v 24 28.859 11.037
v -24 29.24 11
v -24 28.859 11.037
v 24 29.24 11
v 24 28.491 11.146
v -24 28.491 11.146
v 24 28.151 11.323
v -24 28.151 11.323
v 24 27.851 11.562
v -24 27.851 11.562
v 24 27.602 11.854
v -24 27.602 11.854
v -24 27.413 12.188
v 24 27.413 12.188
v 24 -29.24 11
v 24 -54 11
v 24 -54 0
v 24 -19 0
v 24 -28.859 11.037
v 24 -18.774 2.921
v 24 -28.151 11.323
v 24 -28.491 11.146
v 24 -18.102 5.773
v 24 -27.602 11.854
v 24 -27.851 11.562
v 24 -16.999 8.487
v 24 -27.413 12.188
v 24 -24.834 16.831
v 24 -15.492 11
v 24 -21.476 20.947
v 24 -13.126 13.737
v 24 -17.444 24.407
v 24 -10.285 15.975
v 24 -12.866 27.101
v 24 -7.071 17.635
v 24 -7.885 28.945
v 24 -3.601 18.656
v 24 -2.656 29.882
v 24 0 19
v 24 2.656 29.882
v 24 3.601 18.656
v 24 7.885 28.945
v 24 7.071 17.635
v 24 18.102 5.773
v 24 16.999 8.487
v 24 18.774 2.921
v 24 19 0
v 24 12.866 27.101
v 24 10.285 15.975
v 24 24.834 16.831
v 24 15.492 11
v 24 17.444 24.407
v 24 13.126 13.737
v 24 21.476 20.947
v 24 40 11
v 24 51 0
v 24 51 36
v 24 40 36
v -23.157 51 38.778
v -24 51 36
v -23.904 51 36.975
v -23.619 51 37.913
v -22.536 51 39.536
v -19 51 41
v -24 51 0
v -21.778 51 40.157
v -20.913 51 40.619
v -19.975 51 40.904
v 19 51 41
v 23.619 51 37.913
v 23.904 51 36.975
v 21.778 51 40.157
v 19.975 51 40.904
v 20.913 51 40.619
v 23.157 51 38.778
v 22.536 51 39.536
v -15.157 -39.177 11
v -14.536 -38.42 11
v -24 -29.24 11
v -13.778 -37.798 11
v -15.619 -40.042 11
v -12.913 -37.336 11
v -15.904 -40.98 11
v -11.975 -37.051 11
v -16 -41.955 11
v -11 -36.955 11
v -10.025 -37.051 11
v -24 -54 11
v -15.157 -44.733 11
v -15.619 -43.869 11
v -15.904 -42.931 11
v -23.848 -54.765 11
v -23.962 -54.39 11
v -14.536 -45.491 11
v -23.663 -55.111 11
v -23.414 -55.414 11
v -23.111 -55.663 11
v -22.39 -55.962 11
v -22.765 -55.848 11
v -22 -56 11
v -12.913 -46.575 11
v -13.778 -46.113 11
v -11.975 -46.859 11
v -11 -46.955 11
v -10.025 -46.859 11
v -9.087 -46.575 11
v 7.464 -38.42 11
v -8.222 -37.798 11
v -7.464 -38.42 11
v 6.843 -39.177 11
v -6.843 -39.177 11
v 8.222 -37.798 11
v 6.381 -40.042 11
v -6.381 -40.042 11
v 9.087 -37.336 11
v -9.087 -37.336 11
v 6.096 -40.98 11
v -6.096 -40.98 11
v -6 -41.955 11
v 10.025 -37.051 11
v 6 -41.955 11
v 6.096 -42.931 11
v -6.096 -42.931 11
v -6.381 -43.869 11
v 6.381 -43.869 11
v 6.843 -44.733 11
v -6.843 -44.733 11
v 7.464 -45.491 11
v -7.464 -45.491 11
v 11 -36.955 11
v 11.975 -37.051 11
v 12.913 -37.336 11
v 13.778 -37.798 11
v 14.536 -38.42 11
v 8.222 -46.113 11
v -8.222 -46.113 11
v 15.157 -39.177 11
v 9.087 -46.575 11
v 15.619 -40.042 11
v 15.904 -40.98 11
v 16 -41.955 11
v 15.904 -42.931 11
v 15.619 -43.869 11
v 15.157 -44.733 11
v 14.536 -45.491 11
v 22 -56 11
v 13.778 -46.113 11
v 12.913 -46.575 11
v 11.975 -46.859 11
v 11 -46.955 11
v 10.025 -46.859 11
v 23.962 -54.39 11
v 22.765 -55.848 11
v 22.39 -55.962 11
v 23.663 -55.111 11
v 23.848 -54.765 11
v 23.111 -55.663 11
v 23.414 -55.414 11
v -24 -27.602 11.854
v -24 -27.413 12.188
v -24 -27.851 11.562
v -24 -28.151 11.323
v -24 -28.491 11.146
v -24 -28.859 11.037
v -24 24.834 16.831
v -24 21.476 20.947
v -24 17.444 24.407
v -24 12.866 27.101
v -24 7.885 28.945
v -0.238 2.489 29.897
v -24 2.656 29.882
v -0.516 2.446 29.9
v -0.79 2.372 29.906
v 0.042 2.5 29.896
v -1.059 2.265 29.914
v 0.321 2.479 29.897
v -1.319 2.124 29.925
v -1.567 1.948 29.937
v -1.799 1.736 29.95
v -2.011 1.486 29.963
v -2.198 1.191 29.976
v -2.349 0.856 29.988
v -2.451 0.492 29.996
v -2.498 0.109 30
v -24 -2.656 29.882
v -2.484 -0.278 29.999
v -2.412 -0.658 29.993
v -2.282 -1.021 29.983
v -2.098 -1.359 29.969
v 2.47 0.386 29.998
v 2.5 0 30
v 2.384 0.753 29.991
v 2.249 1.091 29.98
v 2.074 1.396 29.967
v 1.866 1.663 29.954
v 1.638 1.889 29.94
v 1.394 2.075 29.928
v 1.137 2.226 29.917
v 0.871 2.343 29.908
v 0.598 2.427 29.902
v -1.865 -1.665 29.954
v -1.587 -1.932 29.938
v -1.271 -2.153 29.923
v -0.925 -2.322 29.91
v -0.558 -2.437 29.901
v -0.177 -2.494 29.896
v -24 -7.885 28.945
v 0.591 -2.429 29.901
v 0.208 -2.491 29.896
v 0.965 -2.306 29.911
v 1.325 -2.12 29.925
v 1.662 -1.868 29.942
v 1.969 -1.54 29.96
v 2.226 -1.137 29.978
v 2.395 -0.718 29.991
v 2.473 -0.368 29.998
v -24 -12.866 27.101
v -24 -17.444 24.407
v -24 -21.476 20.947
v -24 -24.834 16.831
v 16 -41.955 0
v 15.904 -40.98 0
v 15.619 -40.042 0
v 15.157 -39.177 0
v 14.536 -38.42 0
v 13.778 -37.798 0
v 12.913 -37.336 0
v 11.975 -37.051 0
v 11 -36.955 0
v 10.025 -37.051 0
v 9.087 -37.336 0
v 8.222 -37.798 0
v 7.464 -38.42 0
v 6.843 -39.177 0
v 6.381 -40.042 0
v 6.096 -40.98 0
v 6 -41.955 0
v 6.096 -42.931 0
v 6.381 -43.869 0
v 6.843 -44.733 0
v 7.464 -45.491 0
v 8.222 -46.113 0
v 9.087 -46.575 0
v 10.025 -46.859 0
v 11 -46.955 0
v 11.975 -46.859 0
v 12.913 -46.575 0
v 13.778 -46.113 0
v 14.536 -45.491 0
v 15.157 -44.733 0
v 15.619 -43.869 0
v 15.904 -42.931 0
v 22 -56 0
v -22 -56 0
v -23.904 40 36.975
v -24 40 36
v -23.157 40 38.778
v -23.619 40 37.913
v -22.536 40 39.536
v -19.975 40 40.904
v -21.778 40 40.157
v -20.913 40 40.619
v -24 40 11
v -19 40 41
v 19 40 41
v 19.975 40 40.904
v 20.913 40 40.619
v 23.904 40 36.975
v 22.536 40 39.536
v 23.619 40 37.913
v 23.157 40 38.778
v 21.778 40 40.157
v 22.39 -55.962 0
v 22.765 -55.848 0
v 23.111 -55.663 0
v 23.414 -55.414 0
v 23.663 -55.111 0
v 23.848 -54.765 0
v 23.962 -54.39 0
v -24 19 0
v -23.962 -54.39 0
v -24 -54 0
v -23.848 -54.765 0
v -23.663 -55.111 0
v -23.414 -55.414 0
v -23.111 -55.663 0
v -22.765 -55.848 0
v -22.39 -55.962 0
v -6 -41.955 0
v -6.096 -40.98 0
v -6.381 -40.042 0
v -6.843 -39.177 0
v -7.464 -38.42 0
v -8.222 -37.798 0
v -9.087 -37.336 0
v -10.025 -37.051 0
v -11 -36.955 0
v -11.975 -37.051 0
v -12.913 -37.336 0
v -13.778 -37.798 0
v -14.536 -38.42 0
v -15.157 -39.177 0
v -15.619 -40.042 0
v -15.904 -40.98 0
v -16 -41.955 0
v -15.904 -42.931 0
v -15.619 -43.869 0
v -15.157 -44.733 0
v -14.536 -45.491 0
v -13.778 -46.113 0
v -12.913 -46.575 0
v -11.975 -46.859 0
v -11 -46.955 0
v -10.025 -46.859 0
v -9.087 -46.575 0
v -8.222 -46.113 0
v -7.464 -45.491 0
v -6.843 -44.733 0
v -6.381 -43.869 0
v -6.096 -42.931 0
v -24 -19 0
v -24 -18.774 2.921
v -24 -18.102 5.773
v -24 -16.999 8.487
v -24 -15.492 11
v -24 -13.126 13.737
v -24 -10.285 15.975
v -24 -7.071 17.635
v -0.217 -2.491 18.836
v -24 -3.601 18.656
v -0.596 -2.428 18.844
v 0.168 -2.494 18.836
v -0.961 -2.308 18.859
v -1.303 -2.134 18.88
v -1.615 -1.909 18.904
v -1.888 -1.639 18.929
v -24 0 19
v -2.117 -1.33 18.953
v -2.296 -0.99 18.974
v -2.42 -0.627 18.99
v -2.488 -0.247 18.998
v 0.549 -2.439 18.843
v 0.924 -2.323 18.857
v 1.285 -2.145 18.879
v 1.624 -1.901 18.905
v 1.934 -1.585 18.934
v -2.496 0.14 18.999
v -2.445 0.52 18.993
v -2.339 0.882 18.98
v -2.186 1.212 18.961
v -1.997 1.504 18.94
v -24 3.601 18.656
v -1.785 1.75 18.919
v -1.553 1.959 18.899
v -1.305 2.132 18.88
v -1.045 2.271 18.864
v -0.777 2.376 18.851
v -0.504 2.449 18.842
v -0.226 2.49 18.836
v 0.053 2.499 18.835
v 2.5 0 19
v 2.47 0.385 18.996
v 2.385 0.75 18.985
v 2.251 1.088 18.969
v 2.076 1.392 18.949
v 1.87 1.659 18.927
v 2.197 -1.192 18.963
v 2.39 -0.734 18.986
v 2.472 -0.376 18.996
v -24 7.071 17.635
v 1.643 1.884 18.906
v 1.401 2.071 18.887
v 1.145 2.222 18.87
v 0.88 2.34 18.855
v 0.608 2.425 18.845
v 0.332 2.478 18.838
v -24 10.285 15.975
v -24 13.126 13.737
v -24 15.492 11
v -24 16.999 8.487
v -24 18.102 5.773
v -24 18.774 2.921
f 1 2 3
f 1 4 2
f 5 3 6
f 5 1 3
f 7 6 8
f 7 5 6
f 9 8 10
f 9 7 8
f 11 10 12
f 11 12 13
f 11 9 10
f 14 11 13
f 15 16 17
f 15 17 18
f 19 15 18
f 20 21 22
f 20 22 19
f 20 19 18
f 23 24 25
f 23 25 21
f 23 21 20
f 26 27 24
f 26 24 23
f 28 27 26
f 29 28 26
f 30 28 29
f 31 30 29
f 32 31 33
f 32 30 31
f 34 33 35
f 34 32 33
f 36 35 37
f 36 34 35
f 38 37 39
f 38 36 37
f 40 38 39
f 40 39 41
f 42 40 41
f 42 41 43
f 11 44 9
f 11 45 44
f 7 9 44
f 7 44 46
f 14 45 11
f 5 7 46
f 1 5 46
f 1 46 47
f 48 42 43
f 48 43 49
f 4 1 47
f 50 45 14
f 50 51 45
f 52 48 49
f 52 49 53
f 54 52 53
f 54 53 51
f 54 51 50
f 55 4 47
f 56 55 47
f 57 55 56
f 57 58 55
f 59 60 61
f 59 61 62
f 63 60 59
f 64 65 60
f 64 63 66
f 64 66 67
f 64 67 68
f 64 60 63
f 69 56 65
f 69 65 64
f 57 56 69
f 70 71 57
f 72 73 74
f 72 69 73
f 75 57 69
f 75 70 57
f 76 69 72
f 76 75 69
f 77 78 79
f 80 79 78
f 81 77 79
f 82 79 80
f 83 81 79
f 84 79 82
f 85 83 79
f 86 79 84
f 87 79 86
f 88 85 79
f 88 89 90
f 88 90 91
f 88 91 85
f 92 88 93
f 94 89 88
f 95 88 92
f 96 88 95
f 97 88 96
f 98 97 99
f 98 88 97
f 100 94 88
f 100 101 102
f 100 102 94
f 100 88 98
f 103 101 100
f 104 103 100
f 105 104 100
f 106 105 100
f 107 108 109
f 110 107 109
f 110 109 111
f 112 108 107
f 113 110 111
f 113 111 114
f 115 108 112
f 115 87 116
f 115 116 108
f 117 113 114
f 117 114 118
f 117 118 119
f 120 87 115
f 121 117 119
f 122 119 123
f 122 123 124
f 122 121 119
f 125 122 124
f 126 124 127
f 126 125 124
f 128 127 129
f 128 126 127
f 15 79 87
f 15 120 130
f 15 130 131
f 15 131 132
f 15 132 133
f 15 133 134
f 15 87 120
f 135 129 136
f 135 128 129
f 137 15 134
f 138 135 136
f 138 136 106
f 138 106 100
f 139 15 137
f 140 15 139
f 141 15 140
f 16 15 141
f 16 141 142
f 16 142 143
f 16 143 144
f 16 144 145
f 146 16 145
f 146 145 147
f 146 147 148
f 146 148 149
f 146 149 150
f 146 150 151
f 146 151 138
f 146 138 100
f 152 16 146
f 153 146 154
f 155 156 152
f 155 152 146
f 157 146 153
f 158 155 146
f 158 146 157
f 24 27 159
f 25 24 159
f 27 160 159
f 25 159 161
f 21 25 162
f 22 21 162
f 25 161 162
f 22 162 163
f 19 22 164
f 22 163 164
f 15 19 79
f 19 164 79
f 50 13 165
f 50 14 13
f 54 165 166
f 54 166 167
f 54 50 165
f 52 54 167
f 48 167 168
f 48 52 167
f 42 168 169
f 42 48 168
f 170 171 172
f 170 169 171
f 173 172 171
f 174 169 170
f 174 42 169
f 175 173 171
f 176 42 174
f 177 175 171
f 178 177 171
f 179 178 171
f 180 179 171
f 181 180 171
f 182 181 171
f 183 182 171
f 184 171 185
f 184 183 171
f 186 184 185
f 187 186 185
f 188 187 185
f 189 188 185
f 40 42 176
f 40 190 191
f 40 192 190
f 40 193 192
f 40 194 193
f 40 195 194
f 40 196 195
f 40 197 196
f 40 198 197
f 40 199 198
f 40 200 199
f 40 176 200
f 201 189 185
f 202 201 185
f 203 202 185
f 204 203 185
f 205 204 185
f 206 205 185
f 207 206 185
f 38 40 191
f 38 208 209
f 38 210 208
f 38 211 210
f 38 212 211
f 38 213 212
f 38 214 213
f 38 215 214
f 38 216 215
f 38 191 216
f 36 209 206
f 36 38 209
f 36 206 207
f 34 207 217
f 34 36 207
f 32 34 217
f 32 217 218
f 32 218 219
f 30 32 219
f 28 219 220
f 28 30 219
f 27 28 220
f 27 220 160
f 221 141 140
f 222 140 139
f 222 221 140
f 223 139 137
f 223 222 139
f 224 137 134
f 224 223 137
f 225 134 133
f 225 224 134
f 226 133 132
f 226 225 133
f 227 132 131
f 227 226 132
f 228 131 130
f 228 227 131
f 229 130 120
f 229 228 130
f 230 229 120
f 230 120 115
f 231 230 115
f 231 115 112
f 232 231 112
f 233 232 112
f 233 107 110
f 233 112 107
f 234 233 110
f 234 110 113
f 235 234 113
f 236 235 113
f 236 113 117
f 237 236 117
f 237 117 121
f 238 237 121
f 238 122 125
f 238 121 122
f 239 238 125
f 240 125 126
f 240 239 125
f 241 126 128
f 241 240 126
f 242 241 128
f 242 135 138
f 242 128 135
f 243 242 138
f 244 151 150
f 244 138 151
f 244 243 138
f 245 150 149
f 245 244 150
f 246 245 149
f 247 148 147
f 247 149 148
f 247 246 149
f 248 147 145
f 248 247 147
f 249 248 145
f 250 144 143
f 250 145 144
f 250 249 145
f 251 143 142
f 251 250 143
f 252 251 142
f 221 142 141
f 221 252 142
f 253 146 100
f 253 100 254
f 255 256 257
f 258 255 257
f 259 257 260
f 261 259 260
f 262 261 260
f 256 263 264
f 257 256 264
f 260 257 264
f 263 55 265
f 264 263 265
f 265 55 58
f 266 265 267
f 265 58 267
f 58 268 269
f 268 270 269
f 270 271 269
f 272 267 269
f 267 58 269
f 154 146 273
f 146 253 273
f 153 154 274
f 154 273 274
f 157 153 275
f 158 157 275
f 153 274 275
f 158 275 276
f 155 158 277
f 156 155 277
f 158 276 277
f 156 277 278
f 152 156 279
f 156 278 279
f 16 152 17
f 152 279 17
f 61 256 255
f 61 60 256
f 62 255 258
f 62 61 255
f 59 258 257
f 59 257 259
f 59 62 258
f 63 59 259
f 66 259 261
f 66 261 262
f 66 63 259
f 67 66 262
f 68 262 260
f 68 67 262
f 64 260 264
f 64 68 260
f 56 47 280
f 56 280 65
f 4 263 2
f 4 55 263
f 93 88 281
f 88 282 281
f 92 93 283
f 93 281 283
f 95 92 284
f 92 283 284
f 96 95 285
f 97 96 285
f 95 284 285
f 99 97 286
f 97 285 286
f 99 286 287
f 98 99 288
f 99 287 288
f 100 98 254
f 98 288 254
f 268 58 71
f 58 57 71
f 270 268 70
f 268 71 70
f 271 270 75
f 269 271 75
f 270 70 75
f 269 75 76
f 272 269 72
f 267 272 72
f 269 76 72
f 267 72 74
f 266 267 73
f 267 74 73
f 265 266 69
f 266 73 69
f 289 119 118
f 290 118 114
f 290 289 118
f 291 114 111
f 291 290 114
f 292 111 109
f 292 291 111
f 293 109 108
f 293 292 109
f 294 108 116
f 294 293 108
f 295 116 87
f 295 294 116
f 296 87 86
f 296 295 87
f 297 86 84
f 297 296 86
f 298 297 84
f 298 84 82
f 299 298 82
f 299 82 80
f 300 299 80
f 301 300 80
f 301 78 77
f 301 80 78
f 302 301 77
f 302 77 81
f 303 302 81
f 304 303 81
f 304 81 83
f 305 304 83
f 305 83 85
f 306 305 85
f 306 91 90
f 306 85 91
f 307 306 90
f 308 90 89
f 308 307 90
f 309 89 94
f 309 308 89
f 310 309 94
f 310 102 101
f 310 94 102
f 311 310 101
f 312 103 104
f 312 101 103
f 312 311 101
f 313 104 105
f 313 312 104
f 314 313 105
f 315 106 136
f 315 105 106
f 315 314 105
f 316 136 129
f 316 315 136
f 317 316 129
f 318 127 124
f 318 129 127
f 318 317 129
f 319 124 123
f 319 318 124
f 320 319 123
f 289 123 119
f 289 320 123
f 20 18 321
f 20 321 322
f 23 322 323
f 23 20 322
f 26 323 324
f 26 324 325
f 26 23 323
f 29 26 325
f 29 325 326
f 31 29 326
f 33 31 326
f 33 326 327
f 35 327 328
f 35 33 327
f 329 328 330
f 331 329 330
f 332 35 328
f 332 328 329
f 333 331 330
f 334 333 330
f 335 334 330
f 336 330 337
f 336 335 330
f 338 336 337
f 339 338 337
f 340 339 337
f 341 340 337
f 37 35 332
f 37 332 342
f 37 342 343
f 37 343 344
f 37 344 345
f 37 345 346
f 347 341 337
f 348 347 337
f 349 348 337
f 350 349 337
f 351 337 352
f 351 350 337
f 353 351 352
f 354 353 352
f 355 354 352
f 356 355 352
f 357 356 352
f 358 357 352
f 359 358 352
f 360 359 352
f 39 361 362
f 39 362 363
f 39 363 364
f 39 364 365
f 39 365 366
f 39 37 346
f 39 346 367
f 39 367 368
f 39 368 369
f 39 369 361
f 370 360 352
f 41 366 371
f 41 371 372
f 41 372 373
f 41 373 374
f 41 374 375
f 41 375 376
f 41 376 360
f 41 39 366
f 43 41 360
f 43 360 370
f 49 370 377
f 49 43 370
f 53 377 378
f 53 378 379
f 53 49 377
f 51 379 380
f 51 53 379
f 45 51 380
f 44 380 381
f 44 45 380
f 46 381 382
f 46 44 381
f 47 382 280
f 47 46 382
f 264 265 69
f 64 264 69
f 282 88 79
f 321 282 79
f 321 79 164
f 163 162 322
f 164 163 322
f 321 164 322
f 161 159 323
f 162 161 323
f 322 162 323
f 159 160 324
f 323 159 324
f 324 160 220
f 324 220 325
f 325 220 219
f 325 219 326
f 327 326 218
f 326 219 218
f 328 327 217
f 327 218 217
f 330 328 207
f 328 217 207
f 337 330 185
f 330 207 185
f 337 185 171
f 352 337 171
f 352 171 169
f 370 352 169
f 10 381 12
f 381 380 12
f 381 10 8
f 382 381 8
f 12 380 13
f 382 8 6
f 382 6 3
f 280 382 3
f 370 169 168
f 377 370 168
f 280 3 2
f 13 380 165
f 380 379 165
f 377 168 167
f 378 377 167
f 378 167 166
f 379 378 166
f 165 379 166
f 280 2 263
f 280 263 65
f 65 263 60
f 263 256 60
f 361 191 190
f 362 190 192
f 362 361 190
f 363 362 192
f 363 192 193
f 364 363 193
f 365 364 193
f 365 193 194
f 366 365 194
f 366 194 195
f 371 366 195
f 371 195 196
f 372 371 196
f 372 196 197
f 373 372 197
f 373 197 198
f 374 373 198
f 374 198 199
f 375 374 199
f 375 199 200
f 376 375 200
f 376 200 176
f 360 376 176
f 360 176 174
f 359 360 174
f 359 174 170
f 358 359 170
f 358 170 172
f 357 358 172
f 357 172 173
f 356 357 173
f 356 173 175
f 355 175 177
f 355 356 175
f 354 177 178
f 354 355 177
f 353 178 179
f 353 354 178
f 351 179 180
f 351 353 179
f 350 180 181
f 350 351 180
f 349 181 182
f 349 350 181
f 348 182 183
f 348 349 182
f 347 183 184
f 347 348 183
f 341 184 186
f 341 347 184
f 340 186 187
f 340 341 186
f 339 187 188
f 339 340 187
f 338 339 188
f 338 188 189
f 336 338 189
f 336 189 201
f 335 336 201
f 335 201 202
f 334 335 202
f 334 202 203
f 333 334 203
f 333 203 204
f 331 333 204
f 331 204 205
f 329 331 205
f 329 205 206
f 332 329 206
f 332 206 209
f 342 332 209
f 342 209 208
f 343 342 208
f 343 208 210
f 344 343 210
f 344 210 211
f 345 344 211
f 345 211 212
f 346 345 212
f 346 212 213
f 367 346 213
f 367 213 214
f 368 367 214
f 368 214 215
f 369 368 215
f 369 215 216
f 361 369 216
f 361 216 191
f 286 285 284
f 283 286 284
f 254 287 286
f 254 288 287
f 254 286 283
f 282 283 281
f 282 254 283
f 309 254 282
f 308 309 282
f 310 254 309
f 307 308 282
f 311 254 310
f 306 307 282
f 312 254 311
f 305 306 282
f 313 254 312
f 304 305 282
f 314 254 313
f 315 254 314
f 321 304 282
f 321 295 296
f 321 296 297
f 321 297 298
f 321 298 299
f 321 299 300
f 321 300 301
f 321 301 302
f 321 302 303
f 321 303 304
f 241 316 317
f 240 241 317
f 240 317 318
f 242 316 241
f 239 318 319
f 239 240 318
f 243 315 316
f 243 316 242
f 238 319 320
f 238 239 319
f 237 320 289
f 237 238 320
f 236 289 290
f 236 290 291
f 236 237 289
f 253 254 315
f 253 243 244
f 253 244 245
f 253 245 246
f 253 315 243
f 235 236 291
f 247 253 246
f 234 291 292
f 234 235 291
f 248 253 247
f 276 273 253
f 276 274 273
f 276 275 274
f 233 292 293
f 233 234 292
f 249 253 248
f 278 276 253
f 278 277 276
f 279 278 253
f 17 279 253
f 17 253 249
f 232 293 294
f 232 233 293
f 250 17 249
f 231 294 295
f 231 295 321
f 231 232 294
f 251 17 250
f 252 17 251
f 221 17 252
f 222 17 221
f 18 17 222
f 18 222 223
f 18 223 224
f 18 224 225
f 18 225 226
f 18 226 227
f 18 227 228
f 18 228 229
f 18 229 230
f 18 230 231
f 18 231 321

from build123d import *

# Parameters (mm, degrees)
F0_W     = 11
F0_H     = 30
F1_DEPTH = 24
F3_DEPTH = 25
F4_R     = 2.5
F4_R_2   = 5
F5_DEPTH = 41.001
F6_R     = 2
F7_R     = 5
F8_R     = 2


with BuildPart() as f1:
    # F0 (on Right) → F1 (new body, symmetric)
    with BuildSketch(Plane.YZ):
        with BuildLine():
            Line((-56, 0), (-30, 0))
            ThreePointArc((-30, 0), (-29.4730143031, 5.5983415304), (-27.9105714739, 11))
            Line((-27.9105714739, 11), (-56, 11))
            Line((-56, 11), (-56, 0))
        make_face()
        with BuildLine():
            Line((-30, 0), (-19, 0))
            ThreePointArc((-19, 0), (-18.1017503893, 5.7729223833), (-15.4919333848, 11))
            Line((-15.4919333848, 11), (-27.9105714739, 11))
            ThreePointArc((-27.9105714739, 11), (-29.4730143031, 5.5983415304), (-30, 0))
        make_face()
        with BuildLine():
            ThreePointArc((15.4919333848, 11), (18.1017503893, 5.7729223833), (19, 0))
            Line((19, 0), (30, 0))
            ThreePointArc((30, 0), (29.4730143031, 5.5983415304), (27.9105714739, 11))
            Line((27.9105714739, 11), (15.4919333848, 11))
        make_face()
        with BuildLine():
            ThreePointArc((-15.4919333848, 11), (0, 19), (15.4919333848, 11))
            Line((15.4919333848, 11), (27.9105714739, 11))
            ThreePointArc((27.9105714739, 11), (0, 30), (-27.9105714739, 11))
            Line((-27.9105714739, 11), (-15.4919333848, 11))
        make_face()
        with BuildLine():
            ThreePointArc((27.9105714739, 11), (29.4730143031, 5.5983415304), (30, 0))
            Line((30, 0), (51, 0))
            Line((51, 0), (51, 11))
            Line((51, 11), (40, 11))
            Line((40, 11), (27.9105714739, 11))
        make_face()
        with Locations((45.5, 26)):
            Rectangle(F0_W, F0_H)
    extrude(amount=F1_DEPTH, both=True)

    # F2 (on face) → F3 (cut)
    with BuildSketch(Plane(origin=(0, 51, 0), x_dir=(-1, 0, 0), z_dir=(0, 1, 0))):
        with BuildLine():
            ThreePointArc((-6.5, 25), (0, 18.5), (6.5, 25))
            ThreePointArc((6.5, 25), (0, 31.5), (-6.5, 25))
        make_face()
        with BuildLine():
            ThreePointArc((-6.5, 25), (0, 31.5), (6.5, 25))
            Line((6.5, 25), (6.5, 41))
            Line((6.5, 41), (-6.5, 41))
            Line((-6.5, 41), (-6.5, 25))
        make_face()
    extrude(amount=F3_DEPTH, mode=Mode.SUBTRACT)

    # F4 (on Top) → F5 (cut, through all)
    with BuildSketch(Plane.XY):
        Circle(F4_R)
        with Locations((-11, -41.955285737)):
            Circle(F4_R_2)
        with Locations((11, -41.955285737)):
            Circle(F4_R_2)
    extrude(amount=F5_DEPTH, mode=Mode.SUBTRACT)

    # F6
    f6_edges = [f1.edges().sort_by_distance(p)[0] for p in [
        (24, -56, 5.5),
        (-24, -56, 5.5),
    ]]
    fillet(f6_edges, radius=F6_R)

    # F7
    f7_edges = [f1.edges().sort_by_distance(p)[0] for p in [
        (24, 45.5, 41),
        (-24, 45.5, 41),
    ]]
    fillet(f7_edges, radius=F7_R)

    # F8
    f8_edges = [f1.edges().sort_by_distance(p)[0] for p in [
        (0, -27.910571, 11),
        (0, 27.910571, 11),
    ]]
    fillet(f8_edges, radius=F8_R)


solid = f1.part
